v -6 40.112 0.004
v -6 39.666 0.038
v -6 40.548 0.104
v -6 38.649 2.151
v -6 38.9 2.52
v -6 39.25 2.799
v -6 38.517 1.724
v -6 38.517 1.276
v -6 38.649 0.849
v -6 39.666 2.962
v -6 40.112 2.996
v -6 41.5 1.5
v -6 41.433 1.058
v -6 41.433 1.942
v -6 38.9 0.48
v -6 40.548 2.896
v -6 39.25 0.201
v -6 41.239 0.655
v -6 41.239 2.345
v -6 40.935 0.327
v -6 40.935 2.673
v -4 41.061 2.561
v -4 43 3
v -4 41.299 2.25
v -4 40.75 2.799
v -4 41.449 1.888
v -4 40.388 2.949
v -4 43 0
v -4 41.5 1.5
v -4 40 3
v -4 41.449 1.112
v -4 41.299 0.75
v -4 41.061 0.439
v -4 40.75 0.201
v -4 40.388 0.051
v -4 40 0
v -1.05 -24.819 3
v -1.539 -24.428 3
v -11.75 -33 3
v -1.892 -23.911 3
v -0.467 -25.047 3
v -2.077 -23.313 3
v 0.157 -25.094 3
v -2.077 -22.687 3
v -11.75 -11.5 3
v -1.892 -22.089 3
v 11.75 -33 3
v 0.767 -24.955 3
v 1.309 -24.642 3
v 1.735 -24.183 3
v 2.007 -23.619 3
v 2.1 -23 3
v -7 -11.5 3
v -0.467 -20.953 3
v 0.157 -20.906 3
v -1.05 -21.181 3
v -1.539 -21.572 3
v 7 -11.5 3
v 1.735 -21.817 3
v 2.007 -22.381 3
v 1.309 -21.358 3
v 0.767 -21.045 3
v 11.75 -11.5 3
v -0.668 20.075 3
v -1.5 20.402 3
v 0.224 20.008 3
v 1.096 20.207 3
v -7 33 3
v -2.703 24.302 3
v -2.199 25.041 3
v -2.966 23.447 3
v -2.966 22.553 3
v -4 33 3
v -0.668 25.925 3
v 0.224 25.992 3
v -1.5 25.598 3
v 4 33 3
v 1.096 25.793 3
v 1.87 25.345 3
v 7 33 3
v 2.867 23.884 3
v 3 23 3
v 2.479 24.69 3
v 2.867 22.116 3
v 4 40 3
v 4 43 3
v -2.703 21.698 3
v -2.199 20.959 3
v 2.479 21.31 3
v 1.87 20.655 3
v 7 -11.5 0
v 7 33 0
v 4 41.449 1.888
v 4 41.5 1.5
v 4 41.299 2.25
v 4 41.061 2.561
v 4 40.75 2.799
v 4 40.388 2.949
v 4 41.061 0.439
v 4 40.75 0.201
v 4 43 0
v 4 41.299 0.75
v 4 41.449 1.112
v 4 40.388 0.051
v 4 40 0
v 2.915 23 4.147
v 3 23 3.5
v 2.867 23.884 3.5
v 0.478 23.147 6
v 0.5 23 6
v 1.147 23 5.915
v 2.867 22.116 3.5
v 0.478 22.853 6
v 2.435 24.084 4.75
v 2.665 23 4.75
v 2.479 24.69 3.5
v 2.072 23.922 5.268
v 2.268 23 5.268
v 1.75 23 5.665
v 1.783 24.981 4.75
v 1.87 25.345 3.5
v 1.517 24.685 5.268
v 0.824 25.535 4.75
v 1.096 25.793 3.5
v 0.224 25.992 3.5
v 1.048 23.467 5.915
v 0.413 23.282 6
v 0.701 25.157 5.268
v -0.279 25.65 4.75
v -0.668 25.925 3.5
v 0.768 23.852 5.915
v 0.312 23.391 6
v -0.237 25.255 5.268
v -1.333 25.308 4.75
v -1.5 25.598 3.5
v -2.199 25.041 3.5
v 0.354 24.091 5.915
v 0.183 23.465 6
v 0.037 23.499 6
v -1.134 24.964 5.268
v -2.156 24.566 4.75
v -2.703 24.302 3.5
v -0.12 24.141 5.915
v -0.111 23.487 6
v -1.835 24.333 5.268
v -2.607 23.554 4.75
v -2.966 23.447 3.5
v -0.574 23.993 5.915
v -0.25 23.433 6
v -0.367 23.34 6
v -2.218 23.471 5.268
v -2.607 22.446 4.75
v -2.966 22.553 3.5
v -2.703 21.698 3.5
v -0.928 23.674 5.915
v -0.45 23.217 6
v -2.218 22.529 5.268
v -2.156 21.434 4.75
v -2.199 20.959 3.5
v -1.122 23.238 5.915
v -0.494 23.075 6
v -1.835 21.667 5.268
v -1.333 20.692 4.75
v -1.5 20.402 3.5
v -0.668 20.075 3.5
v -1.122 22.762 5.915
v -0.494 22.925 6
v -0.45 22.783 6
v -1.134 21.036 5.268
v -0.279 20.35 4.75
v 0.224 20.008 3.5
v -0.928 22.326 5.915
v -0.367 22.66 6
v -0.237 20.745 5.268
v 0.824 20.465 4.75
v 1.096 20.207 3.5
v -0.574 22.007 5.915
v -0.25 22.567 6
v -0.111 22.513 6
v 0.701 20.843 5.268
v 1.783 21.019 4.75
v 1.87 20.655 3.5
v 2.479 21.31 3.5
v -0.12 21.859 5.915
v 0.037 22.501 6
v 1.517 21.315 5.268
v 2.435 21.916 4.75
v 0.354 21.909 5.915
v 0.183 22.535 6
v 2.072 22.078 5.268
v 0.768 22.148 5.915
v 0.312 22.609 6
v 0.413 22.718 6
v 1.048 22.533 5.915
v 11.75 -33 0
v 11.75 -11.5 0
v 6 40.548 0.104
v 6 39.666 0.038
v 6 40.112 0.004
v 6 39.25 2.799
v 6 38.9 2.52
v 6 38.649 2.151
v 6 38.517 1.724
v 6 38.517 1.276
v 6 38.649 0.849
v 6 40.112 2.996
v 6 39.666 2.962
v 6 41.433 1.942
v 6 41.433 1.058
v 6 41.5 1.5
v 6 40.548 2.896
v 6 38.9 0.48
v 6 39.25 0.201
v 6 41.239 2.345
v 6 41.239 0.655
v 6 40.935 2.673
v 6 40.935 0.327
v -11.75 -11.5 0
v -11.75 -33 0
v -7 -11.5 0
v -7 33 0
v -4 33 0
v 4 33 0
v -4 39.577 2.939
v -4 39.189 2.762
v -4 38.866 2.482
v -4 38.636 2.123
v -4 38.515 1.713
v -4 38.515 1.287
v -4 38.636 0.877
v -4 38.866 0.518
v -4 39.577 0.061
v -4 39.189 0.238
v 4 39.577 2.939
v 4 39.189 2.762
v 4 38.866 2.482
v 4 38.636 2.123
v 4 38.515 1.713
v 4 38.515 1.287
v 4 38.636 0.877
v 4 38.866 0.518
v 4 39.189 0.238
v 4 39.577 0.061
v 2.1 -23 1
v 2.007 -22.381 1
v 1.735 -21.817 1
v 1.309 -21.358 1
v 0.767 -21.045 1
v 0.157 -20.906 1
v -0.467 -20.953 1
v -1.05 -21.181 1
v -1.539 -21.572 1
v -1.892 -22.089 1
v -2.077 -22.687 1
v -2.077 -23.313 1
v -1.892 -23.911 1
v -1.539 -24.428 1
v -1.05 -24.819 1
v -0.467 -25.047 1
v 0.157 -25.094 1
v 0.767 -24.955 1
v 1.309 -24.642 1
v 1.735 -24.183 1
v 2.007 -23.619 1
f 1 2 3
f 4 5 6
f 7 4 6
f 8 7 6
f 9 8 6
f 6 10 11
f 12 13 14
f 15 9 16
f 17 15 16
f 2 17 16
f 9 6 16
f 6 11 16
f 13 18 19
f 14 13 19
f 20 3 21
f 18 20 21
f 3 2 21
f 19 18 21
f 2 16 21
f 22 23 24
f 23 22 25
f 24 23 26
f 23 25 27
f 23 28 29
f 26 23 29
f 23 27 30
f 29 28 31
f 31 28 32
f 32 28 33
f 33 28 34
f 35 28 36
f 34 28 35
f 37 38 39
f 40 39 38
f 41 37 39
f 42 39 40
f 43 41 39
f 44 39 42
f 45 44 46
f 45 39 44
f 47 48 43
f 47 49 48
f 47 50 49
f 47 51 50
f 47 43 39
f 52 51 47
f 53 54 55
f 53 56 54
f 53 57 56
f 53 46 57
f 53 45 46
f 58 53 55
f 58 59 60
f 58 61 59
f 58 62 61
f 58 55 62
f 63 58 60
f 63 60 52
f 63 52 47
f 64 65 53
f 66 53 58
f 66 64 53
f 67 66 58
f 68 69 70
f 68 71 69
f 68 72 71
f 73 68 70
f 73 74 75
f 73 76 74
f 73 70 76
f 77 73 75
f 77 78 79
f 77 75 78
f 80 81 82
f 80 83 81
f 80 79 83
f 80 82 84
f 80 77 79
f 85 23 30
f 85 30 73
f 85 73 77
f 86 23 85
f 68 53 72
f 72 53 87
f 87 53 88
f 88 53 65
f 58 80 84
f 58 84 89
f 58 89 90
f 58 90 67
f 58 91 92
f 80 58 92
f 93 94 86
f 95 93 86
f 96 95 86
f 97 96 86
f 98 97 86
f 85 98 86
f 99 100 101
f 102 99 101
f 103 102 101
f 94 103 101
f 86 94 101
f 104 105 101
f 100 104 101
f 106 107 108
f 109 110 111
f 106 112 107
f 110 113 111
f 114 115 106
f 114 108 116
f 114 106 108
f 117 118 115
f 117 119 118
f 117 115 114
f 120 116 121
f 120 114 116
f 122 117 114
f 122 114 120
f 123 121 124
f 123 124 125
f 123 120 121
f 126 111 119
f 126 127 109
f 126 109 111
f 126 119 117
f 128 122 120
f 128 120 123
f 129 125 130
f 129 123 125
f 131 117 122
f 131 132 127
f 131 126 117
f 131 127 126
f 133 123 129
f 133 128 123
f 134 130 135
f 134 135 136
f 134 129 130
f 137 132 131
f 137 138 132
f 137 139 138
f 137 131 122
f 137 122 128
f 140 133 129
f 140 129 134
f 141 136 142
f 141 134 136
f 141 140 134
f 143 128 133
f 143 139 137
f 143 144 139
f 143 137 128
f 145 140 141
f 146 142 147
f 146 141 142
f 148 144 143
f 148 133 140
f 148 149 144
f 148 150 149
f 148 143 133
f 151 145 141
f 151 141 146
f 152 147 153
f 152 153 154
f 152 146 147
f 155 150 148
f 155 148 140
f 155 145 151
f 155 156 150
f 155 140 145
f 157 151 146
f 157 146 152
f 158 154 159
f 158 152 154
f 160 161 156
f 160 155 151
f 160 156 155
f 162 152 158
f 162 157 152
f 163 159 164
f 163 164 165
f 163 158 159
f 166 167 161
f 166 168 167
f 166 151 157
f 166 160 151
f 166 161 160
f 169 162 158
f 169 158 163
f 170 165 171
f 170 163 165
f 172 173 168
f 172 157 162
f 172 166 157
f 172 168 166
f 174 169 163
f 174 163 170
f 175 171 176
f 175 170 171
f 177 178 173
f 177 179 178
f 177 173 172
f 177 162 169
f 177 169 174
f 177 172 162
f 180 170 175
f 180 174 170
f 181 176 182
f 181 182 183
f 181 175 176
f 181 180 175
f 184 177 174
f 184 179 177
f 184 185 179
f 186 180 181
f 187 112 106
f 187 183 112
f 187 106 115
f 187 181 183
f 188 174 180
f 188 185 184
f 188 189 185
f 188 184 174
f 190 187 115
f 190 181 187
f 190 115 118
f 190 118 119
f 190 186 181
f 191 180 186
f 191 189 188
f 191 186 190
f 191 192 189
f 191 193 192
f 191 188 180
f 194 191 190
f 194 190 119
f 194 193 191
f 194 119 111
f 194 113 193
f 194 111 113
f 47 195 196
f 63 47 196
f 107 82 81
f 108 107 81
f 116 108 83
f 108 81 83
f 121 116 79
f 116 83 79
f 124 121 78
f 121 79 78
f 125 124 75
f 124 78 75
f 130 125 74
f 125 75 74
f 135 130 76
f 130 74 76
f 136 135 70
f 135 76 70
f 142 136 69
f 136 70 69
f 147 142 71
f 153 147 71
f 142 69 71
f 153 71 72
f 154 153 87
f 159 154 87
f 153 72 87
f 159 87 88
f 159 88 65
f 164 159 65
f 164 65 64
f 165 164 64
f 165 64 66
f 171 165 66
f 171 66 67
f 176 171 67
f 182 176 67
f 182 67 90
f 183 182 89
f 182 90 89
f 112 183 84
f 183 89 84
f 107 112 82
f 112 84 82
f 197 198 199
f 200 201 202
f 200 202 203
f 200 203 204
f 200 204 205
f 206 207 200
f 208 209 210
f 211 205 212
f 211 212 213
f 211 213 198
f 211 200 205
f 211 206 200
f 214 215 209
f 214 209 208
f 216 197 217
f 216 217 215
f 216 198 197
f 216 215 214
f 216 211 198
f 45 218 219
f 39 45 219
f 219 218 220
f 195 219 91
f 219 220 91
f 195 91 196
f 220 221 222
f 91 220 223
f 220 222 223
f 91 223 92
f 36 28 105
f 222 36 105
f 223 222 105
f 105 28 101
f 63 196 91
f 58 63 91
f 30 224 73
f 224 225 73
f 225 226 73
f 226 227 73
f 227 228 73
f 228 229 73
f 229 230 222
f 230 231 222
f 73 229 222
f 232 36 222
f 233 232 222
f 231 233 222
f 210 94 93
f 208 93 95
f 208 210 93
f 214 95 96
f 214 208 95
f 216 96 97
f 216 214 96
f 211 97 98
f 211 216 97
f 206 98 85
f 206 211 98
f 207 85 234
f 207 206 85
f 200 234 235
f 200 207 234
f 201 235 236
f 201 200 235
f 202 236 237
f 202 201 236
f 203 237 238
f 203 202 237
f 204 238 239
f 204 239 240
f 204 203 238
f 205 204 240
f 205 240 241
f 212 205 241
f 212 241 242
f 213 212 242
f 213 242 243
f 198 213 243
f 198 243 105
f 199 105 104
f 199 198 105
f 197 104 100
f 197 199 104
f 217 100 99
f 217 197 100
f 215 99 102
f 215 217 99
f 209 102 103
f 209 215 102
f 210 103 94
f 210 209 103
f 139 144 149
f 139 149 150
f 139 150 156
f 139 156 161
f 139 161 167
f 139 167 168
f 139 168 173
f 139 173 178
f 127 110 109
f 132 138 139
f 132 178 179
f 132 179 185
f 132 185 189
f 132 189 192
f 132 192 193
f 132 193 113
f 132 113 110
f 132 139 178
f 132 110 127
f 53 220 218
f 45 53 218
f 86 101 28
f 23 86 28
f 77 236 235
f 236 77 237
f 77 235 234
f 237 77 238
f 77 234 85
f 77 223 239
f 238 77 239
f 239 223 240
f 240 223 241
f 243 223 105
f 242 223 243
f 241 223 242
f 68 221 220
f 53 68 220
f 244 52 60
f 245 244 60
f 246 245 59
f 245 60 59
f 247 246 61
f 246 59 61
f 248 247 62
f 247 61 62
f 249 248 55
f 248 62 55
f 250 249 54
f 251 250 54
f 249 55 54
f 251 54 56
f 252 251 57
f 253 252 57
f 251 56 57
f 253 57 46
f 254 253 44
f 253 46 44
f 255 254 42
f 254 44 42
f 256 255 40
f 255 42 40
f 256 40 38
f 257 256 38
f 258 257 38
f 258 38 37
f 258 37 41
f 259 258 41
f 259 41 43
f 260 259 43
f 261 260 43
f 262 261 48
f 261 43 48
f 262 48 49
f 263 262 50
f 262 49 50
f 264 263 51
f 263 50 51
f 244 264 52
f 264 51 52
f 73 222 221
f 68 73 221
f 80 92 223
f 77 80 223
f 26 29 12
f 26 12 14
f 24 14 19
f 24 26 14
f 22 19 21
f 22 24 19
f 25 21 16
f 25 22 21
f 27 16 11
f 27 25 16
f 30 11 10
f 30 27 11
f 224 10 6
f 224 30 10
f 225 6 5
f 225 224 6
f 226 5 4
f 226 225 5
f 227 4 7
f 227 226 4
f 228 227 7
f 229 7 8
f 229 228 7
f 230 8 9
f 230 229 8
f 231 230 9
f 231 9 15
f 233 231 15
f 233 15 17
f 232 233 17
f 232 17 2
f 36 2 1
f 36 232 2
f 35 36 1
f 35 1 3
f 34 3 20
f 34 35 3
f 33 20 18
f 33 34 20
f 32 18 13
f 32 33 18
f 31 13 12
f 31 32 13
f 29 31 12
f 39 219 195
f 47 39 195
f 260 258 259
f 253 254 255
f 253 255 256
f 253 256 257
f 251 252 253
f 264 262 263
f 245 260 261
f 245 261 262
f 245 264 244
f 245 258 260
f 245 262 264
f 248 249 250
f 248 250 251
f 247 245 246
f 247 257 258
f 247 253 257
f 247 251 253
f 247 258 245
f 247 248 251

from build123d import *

# Parameters (mm, degrees)
PAD_DEPTH    = 3
SKETCH001_R  = 1.5
PAD001_DEPTH = 6
SKETCH002_R  = 2.1
POCKET_DEPTH = 2
SKETCH003_R  = 3
PAD002_DEPTH = 3
FILLET_R     = 2.5


with BuildPart() as part:
    # Sketch → Pad (new body)
    with BuildSketch(Plane.XY):
        Polygon((-11.75, -33), (11.75, -33), (11.75, -11.5), (7, -11.5), (7, 33), (4, 33), (4, 43), (-4, 43), (-4, 33), (-7, 33), (-7, -11.5), (-11.75, -11.5), align=None)
    extrude(amount=PAD_DEPTH)

    # Sketch001 → Pad001 (join, symmetric)
    with BuildSketch(Plane.YZ):
        with Locations((40, 1.5)):
            Circle(SKETCH001_R)
    extrude(amount=PAD001_DEPTH, both=True)

    # Sketch002 (on Face5 of Pad001) → Pocket (cut)
    with BuildSketch(Plane.XY.offset(3)):
        with Locations((0, -23)):
            Circle(SKETCH002_R)
    extrude(amount=-POCKET_DEPTH, mode=Mode.SUBTRACT)

    # Sketch003 (on Face5 of Pocket) → Pad002 (join)
    with BuildSketch(Plane.XY.offset(3)):
        with Locations((0, 23)):
            Circle(SKETCH003_R)
    extrude(amount=PAD002_DEPTH)

    # Fillet
    fillet_edges = [part.edges().sort_by_distance(p)[0] for p in [
        (-3, 23, 6),
    ]]
    fillet(fillet_edges, radius=FILLET_R)


solid = part.part
